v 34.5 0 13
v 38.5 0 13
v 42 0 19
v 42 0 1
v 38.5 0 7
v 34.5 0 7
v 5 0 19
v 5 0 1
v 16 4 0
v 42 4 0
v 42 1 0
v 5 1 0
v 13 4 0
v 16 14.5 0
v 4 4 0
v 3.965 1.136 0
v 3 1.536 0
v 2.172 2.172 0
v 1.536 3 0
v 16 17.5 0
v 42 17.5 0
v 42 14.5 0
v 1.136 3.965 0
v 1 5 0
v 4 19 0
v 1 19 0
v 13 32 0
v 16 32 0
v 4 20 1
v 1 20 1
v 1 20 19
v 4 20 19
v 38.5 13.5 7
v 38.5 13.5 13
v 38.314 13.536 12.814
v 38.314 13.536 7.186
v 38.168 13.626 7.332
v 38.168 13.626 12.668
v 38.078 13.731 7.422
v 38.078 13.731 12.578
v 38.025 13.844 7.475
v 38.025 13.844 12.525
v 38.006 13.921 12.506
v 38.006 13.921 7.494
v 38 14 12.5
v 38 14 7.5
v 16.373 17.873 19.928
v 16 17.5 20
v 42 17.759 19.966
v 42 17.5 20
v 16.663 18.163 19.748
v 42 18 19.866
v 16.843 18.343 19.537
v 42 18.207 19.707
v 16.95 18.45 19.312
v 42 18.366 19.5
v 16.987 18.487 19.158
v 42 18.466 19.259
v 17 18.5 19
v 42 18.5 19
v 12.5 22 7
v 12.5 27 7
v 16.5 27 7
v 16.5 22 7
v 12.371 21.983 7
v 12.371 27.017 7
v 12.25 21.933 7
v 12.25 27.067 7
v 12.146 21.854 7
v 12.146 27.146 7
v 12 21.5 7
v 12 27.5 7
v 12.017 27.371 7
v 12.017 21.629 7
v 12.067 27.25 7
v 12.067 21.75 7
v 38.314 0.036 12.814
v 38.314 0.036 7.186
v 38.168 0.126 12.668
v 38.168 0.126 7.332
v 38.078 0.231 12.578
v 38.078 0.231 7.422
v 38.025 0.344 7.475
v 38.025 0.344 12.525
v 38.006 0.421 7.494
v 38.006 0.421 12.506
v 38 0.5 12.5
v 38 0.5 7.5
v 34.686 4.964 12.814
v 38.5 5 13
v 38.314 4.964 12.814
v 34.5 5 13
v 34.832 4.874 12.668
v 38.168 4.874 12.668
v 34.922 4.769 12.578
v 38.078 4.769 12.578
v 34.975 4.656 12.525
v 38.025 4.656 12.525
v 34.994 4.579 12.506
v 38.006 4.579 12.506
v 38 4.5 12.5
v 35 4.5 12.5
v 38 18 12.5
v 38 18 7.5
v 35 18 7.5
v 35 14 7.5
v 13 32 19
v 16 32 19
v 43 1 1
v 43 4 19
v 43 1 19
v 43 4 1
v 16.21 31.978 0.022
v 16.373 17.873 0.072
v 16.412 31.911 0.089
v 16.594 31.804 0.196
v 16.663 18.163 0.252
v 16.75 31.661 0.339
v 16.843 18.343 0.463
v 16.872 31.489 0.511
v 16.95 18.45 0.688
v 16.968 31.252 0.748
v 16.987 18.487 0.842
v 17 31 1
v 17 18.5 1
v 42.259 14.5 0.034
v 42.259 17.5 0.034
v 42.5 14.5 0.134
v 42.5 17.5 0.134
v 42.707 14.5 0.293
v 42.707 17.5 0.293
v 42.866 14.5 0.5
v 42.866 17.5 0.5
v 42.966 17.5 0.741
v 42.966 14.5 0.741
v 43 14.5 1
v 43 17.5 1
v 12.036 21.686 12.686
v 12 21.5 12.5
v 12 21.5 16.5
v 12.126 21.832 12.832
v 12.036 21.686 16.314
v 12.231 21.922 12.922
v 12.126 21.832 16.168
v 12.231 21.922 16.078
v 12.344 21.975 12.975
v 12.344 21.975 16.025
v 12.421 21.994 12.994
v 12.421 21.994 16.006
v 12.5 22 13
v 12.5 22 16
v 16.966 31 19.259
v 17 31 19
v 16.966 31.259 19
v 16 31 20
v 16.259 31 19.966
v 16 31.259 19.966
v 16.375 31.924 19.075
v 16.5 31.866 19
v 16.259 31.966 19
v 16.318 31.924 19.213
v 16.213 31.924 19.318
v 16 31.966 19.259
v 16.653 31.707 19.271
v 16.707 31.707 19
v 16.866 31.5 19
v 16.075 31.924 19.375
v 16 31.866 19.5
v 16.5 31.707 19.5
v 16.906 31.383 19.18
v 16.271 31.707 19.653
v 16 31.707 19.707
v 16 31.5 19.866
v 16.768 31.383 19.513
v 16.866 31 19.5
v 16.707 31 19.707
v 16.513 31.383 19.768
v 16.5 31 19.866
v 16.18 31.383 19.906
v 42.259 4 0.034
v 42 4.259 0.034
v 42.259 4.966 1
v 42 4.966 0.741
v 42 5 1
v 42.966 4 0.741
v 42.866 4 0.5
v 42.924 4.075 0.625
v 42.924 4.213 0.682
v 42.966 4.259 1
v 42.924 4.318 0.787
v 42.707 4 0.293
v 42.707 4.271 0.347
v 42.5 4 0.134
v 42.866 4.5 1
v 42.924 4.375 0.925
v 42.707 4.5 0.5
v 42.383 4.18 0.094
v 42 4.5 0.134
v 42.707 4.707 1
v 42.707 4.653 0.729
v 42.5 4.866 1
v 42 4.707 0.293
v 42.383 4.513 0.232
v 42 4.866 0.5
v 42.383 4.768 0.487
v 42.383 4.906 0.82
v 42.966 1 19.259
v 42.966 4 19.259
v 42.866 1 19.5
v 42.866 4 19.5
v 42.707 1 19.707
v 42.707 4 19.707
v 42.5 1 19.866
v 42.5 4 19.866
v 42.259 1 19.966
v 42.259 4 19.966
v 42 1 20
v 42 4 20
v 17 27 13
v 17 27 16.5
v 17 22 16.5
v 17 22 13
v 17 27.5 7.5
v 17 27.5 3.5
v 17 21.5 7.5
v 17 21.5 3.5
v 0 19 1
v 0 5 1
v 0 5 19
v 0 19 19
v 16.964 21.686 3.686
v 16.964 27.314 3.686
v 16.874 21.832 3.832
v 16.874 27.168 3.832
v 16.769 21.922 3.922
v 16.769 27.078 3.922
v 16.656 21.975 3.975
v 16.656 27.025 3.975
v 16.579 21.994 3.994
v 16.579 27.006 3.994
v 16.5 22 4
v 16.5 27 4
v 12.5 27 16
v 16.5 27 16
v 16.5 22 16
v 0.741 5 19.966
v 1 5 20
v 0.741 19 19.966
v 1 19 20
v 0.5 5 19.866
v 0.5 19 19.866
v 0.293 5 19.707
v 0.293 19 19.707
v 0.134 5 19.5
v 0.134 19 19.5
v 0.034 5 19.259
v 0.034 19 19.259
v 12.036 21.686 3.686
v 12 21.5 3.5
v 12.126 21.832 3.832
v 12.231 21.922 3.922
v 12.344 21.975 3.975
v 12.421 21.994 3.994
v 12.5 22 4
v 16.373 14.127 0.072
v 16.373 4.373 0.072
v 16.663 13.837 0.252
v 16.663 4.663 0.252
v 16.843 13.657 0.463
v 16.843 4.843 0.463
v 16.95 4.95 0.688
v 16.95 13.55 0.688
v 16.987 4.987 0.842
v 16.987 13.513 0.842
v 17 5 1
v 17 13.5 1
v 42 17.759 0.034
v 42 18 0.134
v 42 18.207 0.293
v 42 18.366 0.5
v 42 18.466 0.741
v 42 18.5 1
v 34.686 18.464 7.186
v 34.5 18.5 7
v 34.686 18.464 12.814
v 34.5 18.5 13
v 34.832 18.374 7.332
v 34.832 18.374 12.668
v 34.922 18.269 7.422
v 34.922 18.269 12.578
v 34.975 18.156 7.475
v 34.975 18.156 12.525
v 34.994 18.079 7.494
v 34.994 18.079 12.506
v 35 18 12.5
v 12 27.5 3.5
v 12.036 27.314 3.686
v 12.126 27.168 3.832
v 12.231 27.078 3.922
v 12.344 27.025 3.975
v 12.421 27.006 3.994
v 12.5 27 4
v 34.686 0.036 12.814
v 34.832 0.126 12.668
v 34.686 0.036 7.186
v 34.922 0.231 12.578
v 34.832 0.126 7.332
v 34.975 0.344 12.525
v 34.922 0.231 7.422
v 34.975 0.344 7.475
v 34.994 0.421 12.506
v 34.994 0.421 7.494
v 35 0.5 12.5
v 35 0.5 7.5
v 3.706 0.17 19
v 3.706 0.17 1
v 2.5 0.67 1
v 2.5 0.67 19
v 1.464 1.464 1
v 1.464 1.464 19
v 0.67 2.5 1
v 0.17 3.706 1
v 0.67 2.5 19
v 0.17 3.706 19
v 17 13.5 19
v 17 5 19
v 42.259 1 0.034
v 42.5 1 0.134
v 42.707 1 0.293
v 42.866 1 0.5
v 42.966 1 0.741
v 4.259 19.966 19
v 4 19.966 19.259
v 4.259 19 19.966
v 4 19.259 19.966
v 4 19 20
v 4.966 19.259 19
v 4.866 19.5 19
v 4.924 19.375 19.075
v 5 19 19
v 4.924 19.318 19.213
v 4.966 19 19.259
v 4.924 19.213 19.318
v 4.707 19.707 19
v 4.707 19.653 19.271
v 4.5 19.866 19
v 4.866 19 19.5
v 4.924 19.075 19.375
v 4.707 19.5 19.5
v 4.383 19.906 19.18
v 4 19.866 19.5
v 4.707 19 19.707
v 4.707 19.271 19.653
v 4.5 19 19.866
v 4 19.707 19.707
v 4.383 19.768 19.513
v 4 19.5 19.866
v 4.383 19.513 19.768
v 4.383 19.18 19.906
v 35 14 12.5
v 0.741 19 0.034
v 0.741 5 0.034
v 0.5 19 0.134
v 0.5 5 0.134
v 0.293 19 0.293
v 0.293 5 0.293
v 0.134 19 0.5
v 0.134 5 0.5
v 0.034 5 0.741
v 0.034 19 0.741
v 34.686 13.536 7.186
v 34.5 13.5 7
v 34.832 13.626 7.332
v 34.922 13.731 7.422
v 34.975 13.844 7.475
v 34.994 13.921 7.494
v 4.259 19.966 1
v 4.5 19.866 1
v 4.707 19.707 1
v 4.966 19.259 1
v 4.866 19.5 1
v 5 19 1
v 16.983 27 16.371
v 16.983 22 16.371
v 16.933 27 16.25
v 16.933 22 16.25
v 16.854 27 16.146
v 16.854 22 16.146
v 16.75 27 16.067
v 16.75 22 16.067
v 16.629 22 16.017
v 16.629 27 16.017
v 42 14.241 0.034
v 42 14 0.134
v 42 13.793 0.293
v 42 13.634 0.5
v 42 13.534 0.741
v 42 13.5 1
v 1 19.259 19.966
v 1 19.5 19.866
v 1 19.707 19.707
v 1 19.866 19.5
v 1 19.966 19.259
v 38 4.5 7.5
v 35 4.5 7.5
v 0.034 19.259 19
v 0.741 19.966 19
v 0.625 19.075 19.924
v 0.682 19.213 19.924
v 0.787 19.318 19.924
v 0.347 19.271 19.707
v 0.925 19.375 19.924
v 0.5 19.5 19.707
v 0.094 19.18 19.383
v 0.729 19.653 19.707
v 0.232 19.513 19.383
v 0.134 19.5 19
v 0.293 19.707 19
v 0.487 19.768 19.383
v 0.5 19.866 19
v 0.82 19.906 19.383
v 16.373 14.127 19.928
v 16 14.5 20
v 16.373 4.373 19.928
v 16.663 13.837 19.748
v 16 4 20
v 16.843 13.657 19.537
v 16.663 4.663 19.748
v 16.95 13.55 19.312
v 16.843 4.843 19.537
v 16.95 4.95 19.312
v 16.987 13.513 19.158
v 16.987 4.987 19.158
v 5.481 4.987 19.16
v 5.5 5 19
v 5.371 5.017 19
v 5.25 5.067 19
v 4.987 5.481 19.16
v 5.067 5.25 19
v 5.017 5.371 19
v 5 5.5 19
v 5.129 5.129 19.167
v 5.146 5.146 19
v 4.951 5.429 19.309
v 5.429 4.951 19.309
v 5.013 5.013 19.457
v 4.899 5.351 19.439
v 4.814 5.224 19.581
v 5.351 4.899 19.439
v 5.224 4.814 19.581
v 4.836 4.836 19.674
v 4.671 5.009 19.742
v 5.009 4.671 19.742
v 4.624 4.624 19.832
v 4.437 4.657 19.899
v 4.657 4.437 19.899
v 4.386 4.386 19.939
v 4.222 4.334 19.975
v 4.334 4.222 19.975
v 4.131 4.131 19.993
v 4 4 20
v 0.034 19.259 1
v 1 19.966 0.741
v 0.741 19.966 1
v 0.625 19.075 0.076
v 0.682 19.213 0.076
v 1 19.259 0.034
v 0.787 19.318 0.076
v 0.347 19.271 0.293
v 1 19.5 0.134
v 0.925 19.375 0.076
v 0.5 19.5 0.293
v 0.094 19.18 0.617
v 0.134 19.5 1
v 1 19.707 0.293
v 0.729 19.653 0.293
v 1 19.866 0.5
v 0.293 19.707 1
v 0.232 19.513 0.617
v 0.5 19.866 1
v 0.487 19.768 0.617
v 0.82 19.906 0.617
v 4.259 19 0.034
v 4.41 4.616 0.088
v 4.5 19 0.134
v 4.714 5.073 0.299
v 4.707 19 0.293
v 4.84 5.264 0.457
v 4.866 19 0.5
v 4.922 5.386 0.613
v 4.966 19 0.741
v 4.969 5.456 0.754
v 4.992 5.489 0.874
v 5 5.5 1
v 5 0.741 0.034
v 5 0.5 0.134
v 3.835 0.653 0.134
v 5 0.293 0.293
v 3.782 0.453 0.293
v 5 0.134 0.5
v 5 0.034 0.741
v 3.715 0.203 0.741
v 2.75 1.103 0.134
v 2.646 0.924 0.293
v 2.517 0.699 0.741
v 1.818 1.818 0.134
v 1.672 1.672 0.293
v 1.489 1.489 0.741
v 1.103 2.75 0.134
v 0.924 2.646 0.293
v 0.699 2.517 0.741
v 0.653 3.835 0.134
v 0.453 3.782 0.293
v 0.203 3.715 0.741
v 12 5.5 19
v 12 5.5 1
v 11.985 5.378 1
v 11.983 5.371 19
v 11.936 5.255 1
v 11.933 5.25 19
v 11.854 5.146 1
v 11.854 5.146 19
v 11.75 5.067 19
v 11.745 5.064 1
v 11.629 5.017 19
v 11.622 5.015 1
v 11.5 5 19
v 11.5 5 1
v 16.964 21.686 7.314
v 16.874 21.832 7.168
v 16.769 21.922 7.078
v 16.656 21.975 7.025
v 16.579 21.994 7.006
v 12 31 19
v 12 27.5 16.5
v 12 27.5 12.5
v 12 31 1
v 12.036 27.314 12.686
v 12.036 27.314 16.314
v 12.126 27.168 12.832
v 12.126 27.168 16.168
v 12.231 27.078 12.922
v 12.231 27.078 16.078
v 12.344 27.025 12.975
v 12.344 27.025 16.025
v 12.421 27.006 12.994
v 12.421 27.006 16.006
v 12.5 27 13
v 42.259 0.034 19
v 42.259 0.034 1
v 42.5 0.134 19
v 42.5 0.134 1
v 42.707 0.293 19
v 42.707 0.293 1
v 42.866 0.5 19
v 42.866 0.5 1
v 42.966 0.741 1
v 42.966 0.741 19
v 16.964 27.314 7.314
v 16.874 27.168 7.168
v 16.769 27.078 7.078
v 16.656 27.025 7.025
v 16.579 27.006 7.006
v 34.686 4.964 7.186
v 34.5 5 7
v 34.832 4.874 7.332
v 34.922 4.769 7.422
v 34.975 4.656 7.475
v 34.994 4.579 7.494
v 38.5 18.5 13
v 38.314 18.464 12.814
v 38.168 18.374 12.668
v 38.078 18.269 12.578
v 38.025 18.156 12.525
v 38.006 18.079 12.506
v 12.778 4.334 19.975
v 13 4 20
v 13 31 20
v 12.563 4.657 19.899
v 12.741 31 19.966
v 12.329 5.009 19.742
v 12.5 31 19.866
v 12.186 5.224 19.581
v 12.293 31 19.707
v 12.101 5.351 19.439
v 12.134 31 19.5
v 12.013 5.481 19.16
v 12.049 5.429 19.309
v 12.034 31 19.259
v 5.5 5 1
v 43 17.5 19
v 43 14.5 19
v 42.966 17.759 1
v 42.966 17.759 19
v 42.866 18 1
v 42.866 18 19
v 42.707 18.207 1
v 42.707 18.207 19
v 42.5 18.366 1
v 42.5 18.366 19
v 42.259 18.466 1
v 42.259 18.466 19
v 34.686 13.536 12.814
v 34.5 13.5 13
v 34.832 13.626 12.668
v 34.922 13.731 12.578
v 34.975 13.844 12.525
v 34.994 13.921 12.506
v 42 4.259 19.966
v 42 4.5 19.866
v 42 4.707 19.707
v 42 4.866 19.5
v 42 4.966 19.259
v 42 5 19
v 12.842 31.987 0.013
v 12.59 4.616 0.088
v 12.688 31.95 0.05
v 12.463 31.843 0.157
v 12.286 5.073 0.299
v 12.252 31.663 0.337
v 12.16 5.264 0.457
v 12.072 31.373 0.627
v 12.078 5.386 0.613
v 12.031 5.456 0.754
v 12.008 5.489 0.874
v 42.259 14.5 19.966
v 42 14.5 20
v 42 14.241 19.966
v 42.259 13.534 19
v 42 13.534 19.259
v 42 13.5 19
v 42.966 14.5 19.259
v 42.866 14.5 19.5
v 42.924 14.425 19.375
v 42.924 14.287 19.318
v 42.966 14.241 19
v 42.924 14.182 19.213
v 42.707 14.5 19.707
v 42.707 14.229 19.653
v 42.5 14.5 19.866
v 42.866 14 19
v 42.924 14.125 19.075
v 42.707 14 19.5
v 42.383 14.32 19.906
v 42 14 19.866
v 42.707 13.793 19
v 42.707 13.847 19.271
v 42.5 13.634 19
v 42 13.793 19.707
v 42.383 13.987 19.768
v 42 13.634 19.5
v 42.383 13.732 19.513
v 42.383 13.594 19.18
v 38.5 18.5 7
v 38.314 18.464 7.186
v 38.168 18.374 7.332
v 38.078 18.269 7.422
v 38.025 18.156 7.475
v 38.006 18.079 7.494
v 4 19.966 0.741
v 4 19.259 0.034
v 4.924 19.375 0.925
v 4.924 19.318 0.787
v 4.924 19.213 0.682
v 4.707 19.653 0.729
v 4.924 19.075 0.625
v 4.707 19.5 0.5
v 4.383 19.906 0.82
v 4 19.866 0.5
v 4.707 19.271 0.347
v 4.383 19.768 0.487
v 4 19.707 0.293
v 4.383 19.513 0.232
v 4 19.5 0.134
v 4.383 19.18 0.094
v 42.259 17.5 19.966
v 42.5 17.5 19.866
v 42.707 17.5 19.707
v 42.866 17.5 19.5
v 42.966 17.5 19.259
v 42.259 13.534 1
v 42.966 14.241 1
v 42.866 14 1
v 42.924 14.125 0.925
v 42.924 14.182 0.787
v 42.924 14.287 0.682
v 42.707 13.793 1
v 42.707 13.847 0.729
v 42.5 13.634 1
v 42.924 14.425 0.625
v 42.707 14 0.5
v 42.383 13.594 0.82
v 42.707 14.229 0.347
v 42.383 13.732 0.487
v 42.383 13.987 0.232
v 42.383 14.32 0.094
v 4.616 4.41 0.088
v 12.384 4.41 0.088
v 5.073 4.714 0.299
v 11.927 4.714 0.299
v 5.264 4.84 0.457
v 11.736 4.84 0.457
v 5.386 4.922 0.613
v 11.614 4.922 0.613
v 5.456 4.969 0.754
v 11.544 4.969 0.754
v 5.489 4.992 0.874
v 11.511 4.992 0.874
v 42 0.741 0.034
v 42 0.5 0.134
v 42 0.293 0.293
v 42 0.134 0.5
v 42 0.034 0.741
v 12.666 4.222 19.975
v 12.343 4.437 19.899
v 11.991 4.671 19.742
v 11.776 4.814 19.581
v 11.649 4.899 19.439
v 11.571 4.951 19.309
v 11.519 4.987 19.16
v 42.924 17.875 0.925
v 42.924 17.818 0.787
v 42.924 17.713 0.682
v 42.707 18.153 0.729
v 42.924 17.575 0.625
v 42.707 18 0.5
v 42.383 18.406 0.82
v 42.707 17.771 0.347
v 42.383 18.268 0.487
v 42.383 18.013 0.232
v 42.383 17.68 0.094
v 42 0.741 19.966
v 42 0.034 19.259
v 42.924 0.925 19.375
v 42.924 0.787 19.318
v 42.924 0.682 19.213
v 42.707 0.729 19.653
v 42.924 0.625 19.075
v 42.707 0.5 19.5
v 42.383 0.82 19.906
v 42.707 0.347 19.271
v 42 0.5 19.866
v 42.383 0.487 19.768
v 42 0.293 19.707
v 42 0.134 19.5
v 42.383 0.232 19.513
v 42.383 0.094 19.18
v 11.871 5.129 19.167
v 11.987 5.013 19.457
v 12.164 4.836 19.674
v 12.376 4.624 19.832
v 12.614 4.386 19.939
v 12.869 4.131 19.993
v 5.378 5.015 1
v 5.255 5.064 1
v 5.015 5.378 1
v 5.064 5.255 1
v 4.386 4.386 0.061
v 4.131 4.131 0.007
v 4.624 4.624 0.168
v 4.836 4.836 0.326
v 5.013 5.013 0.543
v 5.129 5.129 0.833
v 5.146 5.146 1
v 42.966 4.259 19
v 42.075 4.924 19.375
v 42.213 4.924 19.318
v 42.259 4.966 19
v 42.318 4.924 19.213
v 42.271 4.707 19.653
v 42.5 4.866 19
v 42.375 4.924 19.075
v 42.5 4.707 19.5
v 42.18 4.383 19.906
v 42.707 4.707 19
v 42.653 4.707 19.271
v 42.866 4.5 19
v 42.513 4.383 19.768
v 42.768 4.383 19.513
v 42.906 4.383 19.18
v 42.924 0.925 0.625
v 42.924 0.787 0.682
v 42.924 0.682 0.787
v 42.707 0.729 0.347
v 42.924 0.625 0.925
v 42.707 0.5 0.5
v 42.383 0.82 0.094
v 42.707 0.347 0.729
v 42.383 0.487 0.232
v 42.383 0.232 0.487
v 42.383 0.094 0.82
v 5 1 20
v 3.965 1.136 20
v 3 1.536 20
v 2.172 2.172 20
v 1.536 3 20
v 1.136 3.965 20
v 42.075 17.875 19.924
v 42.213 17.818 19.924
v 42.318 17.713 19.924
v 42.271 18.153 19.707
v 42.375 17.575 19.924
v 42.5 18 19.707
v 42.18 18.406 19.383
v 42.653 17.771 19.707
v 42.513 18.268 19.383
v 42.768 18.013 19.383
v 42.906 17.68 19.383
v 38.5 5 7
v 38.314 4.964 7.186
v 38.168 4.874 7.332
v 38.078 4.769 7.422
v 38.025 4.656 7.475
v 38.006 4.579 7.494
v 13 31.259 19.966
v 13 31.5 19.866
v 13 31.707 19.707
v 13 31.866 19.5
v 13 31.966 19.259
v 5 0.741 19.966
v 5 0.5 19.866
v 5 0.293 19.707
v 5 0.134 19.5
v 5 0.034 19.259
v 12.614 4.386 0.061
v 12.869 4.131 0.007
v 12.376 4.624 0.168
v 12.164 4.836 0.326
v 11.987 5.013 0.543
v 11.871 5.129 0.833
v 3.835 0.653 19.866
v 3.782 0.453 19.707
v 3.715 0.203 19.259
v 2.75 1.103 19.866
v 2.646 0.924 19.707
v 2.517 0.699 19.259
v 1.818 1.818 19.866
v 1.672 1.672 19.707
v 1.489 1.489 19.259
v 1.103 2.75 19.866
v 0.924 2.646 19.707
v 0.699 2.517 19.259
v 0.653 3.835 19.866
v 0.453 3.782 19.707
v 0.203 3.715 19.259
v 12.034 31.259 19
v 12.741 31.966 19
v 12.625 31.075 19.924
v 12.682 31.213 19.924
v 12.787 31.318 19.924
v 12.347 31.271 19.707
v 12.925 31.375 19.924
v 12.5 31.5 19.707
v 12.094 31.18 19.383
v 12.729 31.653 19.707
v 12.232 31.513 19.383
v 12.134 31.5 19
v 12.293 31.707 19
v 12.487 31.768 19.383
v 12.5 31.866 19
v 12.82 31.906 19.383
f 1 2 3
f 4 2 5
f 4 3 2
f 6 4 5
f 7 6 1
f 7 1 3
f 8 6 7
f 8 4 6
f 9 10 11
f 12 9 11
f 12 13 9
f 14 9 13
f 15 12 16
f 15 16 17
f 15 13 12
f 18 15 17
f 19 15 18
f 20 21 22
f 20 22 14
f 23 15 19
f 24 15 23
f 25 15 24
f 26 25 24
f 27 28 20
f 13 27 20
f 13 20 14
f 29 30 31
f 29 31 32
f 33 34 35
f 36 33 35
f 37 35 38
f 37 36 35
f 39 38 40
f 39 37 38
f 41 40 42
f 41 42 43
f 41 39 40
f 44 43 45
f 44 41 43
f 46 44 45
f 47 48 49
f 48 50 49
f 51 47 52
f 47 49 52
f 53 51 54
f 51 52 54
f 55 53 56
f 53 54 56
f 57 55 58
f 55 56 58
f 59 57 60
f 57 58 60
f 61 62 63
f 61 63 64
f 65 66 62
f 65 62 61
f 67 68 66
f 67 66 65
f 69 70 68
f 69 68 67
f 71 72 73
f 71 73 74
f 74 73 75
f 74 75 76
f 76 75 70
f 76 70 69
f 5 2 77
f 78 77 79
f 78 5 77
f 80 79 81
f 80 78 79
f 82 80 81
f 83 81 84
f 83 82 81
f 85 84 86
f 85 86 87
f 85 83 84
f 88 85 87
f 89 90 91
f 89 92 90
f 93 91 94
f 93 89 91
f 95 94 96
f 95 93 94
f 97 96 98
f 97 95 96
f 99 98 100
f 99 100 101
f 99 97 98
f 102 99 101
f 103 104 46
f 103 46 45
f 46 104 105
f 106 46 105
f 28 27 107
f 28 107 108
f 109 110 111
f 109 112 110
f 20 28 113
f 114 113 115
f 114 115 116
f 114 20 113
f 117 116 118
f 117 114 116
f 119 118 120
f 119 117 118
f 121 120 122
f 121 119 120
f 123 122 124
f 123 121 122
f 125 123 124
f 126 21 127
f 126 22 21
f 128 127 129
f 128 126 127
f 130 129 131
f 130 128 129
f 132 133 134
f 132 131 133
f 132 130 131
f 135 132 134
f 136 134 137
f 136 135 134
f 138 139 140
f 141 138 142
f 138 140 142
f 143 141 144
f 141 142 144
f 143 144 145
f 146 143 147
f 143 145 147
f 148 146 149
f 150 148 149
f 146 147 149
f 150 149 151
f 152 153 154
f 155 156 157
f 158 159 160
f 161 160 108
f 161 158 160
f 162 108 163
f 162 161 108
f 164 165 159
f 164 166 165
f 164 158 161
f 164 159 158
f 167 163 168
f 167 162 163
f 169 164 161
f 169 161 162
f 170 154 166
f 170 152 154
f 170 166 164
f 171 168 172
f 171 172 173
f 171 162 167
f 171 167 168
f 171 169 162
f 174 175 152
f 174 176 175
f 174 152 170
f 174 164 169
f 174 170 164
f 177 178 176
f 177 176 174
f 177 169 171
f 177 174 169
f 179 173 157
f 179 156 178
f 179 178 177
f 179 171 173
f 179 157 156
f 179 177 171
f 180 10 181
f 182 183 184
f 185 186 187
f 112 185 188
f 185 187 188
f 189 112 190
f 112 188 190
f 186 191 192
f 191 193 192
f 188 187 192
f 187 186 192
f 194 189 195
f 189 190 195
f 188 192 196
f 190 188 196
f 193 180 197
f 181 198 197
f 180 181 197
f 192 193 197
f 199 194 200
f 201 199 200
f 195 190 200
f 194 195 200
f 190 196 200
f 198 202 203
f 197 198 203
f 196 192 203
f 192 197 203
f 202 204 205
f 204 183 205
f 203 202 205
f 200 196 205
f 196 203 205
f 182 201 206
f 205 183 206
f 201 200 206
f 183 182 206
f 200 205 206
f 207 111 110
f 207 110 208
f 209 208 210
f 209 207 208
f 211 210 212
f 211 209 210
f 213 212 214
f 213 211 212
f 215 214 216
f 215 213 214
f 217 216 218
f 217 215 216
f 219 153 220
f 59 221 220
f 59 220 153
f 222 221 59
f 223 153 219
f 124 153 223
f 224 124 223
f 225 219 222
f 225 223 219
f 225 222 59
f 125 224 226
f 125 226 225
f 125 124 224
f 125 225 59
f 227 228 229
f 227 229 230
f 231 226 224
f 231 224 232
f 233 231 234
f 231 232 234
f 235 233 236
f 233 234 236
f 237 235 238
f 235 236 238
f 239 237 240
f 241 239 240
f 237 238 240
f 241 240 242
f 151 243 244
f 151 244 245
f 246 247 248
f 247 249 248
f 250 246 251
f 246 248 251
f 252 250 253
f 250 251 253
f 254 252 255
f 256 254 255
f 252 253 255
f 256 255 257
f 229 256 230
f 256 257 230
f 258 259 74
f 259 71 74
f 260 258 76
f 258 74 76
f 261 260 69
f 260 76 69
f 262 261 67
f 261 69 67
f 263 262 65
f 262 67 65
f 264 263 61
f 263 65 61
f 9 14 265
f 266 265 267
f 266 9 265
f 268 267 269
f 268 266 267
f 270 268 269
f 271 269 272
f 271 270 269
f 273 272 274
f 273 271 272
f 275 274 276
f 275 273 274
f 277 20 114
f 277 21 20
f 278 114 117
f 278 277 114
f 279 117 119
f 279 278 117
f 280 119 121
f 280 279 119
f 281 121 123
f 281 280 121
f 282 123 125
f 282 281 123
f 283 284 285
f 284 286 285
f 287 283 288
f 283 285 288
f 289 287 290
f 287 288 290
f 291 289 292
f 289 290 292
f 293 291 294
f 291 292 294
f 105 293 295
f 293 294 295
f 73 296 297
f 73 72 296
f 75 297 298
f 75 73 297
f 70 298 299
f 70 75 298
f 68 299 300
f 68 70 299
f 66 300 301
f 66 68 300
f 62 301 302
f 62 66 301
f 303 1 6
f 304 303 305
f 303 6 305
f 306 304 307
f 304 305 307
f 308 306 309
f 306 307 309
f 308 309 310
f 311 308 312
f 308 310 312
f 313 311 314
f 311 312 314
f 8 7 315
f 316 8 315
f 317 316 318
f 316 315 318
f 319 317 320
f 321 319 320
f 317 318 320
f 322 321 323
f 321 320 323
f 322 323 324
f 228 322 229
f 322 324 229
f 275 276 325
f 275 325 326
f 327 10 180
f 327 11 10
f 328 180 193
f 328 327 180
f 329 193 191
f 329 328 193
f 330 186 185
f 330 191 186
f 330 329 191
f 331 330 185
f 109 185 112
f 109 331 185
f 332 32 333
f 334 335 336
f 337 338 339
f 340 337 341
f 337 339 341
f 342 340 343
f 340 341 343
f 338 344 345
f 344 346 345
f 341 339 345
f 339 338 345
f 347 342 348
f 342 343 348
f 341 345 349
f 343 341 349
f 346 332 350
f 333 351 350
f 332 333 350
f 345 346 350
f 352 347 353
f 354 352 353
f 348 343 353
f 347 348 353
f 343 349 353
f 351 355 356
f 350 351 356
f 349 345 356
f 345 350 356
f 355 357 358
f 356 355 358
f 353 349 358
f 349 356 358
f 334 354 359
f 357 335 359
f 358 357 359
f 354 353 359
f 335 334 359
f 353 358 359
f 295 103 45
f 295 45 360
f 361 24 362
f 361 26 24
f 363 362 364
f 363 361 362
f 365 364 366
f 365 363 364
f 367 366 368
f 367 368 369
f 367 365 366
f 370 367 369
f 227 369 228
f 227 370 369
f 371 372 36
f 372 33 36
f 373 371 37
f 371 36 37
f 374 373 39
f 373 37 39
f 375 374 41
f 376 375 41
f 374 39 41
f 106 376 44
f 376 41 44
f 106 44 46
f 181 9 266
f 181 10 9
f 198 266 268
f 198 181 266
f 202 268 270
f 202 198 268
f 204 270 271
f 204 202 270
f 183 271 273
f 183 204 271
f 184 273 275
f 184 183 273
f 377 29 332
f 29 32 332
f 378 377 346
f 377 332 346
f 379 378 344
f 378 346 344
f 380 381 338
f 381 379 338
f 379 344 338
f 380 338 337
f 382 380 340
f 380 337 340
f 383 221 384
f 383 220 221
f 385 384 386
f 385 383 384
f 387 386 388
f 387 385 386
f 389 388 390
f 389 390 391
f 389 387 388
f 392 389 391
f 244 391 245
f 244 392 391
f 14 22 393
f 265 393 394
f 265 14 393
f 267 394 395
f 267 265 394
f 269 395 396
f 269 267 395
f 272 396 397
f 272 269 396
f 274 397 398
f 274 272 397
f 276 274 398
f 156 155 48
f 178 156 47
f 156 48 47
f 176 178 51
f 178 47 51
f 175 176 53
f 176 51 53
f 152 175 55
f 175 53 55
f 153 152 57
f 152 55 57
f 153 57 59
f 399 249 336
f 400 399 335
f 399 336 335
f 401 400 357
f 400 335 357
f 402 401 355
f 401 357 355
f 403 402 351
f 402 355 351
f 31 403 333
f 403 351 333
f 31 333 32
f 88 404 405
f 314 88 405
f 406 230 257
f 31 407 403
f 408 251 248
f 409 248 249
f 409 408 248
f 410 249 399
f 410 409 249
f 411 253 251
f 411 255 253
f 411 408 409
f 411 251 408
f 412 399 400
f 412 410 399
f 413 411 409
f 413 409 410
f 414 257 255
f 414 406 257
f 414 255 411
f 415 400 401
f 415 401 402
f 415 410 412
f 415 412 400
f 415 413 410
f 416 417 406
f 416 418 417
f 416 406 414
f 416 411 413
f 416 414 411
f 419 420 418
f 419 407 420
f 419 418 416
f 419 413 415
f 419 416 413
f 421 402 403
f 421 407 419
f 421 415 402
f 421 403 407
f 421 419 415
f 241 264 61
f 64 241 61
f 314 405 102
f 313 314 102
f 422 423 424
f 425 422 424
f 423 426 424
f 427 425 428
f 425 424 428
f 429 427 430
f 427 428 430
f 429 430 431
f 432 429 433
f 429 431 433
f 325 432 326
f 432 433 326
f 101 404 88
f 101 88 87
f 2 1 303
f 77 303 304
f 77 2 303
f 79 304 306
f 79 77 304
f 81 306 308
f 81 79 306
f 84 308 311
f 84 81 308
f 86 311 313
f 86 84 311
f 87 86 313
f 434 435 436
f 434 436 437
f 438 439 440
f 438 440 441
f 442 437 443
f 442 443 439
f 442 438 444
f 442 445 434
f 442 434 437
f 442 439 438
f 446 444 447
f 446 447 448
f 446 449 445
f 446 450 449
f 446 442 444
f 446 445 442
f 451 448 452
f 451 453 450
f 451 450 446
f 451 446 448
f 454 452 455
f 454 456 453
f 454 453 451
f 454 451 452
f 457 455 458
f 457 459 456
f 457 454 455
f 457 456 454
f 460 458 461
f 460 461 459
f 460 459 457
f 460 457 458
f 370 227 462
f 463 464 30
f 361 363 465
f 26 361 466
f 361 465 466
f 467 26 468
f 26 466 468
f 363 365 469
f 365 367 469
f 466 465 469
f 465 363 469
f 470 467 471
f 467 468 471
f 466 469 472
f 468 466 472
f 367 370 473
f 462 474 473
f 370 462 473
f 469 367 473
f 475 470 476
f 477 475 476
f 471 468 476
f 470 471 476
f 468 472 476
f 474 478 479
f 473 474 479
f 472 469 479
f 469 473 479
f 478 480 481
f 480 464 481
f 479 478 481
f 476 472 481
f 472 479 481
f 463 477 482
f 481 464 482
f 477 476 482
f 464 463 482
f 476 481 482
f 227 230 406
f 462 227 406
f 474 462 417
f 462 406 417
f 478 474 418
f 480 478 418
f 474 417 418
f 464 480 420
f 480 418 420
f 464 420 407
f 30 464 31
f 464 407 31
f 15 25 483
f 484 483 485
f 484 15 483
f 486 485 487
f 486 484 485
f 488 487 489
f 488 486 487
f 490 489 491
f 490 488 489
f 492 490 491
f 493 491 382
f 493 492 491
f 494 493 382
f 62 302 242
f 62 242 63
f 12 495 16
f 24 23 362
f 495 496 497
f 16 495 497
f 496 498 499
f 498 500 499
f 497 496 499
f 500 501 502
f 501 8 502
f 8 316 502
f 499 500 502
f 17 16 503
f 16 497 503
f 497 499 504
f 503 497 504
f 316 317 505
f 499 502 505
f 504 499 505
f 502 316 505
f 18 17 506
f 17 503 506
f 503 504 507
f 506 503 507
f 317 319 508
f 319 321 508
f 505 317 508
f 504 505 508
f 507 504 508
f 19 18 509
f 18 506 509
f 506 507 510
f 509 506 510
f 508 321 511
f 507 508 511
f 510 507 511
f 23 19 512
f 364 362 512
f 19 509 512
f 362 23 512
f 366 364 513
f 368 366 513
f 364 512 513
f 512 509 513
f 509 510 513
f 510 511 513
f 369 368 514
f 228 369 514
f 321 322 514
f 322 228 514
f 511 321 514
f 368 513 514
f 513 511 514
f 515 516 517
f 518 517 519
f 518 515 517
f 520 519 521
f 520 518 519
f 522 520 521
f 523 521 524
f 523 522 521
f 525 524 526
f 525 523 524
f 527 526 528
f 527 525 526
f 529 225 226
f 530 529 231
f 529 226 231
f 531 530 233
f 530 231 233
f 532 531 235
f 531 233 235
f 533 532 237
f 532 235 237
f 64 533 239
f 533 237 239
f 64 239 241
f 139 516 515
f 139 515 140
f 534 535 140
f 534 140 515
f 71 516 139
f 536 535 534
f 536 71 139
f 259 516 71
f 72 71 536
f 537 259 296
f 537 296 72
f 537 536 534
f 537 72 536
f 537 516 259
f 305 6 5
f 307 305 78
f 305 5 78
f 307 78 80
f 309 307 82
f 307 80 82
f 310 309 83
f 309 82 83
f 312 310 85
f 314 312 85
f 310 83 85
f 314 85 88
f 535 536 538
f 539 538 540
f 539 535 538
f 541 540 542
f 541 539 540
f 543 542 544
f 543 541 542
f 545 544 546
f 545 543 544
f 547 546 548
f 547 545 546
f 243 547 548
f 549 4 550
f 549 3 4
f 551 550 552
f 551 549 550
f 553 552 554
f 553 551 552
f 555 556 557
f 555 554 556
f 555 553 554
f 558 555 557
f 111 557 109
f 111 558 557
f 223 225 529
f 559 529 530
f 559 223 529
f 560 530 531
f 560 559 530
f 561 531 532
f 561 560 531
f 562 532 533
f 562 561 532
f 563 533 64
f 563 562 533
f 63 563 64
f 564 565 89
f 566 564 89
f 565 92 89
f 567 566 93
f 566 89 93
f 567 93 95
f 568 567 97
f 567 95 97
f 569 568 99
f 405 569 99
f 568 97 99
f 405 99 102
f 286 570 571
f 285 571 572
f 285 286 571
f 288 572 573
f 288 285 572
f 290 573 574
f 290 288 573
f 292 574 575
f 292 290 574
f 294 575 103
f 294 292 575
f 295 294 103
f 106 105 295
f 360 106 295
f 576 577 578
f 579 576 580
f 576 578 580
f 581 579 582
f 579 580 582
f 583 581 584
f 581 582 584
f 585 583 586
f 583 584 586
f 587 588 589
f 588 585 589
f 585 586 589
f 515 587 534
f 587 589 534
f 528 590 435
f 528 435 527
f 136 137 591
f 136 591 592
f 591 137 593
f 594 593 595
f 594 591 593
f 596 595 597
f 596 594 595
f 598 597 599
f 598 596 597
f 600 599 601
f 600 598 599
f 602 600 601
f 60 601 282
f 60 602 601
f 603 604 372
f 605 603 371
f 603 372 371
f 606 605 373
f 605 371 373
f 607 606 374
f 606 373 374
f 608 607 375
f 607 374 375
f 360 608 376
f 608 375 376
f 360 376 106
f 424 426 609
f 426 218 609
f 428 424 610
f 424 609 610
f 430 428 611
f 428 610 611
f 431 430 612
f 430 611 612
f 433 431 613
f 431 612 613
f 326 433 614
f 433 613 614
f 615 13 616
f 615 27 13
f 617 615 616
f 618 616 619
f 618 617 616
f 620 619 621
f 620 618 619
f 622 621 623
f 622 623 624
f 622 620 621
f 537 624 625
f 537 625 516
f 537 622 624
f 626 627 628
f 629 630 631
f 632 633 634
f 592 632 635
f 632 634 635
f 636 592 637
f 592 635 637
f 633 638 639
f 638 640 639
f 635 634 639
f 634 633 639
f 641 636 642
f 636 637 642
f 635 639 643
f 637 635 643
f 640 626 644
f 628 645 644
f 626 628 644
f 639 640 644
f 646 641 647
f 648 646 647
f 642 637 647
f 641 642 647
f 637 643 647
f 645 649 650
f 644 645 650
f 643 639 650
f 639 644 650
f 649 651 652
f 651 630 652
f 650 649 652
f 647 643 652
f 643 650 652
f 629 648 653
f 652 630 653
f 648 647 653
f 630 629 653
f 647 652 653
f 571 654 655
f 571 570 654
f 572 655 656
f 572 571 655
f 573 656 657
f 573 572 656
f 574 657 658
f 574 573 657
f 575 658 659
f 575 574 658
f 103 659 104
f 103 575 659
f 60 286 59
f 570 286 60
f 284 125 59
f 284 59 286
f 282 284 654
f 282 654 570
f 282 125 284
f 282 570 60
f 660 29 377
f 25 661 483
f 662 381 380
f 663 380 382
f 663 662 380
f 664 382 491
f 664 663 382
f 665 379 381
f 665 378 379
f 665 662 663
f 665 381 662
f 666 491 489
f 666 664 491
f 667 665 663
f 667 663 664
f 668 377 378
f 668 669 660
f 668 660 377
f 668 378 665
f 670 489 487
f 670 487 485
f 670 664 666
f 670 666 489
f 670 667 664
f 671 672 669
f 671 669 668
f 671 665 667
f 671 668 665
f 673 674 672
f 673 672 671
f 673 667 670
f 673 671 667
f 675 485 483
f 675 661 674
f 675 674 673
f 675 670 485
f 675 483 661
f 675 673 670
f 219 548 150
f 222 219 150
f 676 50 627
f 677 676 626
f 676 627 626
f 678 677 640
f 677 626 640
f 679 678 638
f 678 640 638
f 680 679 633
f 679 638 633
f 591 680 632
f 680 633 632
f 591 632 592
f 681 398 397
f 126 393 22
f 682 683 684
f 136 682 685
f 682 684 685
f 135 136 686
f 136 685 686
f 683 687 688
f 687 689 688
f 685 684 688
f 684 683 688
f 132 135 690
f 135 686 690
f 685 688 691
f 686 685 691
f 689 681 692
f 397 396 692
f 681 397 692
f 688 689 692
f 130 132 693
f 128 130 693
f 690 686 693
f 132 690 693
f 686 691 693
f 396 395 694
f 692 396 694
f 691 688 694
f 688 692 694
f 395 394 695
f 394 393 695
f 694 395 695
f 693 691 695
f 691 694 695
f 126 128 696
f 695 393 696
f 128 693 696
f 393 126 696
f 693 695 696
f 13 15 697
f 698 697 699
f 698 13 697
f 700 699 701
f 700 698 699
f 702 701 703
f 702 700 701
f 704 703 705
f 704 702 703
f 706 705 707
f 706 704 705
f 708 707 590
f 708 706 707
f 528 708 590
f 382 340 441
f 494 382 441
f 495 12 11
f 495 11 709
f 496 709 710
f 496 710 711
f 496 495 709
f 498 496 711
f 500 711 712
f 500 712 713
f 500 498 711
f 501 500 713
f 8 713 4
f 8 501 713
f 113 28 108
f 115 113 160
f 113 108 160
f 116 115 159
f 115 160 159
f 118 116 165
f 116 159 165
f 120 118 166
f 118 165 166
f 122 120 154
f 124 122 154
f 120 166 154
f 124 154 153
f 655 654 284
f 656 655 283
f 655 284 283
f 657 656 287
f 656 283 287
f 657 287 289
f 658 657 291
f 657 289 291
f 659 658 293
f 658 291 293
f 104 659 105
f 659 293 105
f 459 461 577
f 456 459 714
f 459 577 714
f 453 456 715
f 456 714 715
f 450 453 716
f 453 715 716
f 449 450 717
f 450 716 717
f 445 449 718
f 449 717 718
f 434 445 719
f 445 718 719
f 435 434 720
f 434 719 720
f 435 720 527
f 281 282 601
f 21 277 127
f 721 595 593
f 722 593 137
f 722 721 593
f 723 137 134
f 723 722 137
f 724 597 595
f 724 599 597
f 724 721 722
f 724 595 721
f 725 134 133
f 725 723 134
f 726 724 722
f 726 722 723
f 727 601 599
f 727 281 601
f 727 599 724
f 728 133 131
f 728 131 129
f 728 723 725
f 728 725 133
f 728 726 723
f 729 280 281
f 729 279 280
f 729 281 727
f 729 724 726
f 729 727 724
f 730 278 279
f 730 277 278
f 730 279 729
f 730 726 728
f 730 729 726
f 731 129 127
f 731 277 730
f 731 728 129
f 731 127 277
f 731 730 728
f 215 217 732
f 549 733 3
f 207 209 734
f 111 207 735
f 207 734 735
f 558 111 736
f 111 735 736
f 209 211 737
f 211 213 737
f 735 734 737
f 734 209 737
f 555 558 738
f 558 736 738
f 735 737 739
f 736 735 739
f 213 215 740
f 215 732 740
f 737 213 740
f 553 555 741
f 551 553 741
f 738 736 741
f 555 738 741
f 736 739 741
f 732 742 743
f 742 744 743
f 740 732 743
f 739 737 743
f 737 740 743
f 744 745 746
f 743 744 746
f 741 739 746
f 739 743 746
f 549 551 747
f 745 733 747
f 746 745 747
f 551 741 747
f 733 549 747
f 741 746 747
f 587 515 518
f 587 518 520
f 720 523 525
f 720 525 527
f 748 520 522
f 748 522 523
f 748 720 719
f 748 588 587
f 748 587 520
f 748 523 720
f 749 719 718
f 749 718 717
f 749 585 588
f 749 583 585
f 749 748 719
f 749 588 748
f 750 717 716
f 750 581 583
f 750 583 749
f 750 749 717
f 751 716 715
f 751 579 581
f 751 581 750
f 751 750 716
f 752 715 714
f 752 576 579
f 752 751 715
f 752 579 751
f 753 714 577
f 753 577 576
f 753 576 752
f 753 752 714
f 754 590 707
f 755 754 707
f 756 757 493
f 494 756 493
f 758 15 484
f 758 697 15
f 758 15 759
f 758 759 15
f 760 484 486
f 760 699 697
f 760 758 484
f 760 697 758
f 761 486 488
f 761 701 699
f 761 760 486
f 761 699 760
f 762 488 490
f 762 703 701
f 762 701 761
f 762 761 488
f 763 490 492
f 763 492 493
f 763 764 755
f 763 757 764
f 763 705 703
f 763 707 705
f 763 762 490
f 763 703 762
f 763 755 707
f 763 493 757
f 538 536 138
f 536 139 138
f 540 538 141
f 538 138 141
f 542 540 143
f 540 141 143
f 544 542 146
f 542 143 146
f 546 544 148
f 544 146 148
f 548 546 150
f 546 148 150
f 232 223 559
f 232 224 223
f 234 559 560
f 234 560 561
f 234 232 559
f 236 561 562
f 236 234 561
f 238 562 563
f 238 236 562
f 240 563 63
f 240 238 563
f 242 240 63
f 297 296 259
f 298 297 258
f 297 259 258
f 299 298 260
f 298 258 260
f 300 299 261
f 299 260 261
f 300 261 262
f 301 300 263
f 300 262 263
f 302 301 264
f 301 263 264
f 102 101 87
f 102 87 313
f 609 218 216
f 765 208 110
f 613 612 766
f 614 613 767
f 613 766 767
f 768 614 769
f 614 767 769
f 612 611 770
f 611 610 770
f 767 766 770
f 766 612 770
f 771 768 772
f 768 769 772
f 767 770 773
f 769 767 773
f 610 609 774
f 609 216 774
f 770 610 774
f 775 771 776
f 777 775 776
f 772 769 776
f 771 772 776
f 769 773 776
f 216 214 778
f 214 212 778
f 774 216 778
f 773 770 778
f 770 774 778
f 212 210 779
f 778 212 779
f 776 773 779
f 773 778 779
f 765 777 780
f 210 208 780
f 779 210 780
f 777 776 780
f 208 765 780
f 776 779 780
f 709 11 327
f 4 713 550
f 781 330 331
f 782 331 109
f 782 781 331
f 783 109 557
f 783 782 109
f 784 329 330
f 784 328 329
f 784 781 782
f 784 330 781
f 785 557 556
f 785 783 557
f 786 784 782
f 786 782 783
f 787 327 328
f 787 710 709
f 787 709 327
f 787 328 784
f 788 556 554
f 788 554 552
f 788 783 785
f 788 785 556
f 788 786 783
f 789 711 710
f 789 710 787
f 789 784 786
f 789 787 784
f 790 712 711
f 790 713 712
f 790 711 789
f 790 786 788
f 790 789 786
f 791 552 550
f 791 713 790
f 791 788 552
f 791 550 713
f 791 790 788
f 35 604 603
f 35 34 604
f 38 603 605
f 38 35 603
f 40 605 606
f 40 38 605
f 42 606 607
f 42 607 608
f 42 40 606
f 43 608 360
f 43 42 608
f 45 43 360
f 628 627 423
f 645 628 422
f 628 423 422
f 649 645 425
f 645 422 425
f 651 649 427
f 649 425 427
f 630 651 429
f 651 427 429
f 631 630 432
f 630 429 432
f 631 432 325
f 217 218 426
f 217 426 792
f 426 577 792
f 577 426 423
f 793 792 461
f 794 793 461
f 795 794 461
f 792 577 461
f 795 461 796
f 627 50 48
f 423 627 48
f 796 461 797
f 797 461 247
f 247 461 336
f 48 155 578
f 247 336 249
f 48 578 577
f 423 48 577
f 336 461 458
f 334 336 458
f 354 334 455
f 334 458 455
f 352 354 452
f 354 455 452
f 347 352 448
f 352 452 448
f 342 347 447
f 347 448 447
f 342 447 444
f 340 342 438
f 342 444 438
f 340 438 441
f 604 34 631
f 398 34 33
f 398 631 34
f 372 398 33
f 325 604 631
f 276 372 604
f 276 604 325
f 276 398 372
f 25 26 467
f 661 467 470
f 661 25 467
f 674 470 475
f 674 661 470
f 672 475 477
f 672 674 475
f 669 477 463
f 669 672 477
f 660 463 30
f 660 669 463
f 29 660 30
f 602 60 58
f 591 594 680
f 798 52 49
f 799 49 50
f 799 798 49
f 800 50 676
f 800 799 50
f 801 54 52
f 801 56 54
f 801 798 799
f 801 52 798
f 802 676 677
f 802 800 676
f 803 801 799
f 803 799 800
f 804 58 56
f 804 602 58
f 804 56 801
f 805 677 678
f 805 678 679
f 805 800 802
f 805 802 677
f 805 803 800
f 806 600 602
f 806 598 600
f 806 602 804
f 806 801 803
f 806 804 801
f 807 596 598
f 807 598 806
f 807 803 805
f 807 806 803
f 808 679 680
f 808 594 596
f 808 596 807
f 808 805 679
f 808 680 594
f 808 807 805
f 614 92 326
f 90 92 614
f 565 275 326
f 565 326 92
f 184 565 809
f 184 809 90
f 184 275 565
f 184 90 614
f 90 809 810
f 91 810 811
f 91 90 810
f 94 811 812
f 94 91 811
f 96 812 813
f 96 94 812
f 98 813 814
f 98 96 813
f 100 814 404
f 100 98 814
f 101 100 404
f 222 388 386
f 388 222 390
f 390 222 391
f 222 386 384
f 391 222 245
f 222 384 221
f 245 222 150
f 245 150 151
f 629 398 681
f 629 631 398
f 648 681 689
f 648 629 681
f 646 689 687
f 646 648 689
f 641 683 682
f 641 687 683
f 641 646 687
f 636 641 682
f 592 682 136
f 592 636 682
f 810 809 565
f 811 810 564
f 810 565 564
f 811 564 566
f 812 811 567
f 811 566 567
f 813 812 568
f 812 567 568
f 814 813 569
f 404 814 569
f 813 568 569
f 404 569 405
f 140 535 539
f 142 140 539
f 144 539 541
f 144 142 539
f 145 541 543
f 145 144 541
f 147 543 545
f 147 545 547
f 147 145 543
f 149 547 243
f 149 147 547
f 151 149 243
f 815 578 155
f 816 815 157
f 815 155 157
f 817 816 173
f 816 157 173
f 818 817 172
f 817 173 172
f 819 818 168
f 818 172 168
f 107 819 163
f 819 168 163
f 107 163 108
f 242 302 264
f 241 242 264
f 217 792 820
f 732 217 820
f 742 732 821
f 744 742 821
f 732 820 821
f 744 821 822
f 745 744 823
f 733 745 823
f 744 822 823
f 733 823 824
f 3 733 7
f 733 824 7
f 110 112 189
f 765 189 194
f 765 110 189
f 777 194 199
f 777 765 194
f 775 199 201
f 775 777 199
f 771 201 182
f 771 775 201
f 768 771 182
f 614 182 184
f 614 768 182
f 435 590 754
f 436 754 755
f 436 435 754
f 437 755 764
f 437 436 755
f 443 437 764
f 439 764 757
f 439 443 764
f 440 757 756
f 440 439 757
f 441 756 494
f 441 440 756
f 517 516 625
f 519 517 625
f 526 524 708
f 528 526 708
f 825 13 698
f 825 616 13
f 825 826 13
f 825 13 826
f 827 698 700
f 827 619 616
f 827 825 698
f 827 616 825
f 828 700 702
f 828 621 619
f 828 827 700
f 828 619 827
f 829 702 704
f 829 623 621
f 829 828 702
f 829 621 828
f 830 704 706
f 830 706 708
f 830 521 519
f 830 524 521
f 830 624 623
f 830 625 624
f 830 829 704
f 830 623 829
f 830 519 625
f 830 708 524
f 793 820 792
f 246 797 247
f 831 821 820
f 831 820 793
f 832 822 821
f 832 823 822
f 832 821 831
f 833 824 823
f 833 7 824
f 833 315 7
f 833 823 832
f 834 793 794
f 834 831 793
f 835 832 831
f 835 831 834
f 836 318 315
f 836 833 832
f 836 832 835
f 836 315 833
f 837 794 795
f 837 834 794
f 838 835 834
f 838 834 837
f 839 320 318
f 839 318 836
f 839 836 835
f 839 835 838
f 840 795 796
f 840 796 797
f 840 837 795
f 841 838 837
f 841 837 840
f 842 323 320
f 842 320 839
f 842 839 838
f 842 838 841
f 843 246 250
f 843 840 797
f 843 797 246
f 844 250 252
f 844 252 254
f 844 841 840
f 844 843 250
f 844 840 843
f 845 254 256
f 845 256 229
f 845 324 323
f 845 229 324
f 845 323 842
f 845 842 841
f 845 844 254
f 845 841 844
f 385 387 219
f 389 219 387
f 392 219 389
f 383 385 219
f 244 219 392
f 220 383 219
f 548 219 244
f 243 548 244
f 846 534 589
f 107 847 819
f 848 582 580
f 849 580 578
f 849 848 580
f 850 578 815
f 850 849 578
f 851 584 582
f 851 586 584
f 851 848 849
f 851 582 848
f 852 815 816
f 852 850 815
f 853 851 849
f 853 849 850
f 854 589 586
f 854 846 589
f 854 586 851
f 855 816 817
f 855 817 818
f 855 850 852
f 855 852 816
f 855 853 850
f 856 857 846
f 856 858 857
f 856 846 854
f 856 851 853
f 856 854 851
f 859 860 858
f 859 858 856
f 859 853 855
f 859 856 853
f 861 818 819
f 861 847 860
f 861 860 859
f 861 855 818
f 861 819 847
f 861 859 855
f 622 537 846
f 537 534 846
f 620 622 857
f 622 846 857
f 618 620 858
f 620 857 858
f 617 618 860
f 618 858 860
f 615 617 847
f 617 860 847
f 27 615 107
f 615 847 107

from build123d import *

# Parameters (mm, degrees)
PAD_DEPTH       = 20
FILLET_R        = 5
FILLET001_R     = 1
SKETCH001_W     = 5
SKETCH001_H     = 3
POCKET_DEPTH    = 31.001
FILLET002_R     = 0.5
SKETCH002_W     = 3
SKETCH002_H     = 5
POCKET001_DEPTH = 18.501
FILLET003_R     = 0.5


with BuildPart() as part:
    # Sketch → Pad (new body)
    with BuildSketch(Plane.XY):
        Polygon((5, 20), (5, 5), (12, 5), (12, 32), (17, 32), (17, 18.5), (43, 18.5), (43, 13.5), (17, 13.5), (17, 5), (43, 5), (43, 0), (0, 0), (0, 20), align=None)
    extrude(amount=PAD_DEPTH)

    # Fillet
    fillet_edges = [part.edges().sort_by_distance(p)[0] for p in [
        (0, 0, 10),
    ]]
    fillet(fillet_edges, radius=FILLET_R)

    # Fillet001
    fillet001_edges = [part.edges().sort_by_distance(p)[0] for p in [
        (0, 20, 10),
        (0, 12.5, 20),
        (0, 12.5, 0),
        (2.5, 20, 20),
        (2.5, 20, 0),
        (5, 20, 10),
        (12, 32, 10),
        (12, 18.5, 20),
        (8.5, 5, 20),
        (5, 12.5, 20),
        (17, 25.25, 20),
        (17, 32, 10),
        (30, 18.5, 0),
        (43, 18.5, 10),
        (30, 18.5, 20),
        (24, 0, 20),
        (1.464466, 1.464466, 20),
        (43, 2.5, 20),
        (30, 5, 20),
        (17, 9.25, 20),
        (30, 13.5, 20),
        (43, 16, 20),
        (14.5, 32, 20),
        (12, 18.5, 0),
        (17, 25.25, 0),
        (30, 13.5, 0),
        (17, 9.25, 0),
        (30, 5, 0),
        (8.5, 5, 0),
        (24, 0, 0),
        (43, 13.5, 10),
        (43, 16, 0),
        (43, 2.5, 0),
        (43, 0, 10),
        (43, 5, 10),
        (5, 12.5, 0),
    ]]
    fillet(fillet001_edges, radius=FILLET001_R)

    # Sketch001 (on Face47 of Fillet001) → Pocket (cut, through all)
    with BuildSketch(Plane(origin=(12, 0, 0), x_dir=(0, -1, 0), z_dir=(-1, 0, 0))):
        with Locations((-24.5, 5.5)):
            Rectangle(SKETCH001_W, SKETCH001_H)
        with Locations((-24.5, 14.5)):
            Rectangle(SKETCH001_W, SKETCH001_H)
    extrude(amount=-POCKET_DEPTH, mode=Mode.SUBTRACT)

    # Fillet002
    fillet002_edges = [part.edges().sort_by_distance(p)[0] for p in [
        (12, 22, 5.5),
        (12, 24.5, 16),
        (12, 27, 5.5),
        (12, 24.5, 4),
        (12, 24.5, 13),
        (12, 27, 14.5),
        (12, 5, 10),
        (12, 22, 14.5),
        (17, 27, 5.5),
        (17, 24.5, 16),
        (17, 22, 5.5),
        (17, 24.5, 4),
        (42.707107, 18.207107, 1),
        (17, 24.5, 7),
        (5, 5, 10),
        (42, 18.5, 10),
    ]]
    fillet(fillet002_edges, radius=FILLET002_R)

    # Sketch002 (on Face46 of Fillet002) → Pocket001 (cut, through all)
    with BuildSketch(Plane(origin=(0, 18.5, 0), x_dir=(-1, 0, 0), z_dir=(0, 1, 0))):
        with Locations((-36.5, 10)):
            Rectangle(SKETCH002_W, SKETCH002_H)
    extrude(amount=-POCKET001_DEPTH, mode=Mode.SUBTRACT)

    # Fillet003
    fillet003_edges = [part.edges().sort_by_distance(p)[0] for p in [
        (35, 18.5, 10),
        (36.5, 18.5, 7.5),
        (38, 18.5, 10),
        (36.5, 18.5, 12.5),
        (36.5, 5, 7.5),
        (38, 5, 10),
        (35, 5, 10),
        (36.5, 5, 12.5),
        (36.5, 0, 12.5),
        (35, 0, 10),
        (36.5, 0, 7.5),
        (38, 0, 10),
        (35, 13.5, 10),
        (36.5, 13.5, 12.5),
        (38, 13.5, 10),
        (36.5, 13.5, 7.5),
    ]]
    fillet(fillet003_edges, radius=FILLET003_R)


solid = part.part
